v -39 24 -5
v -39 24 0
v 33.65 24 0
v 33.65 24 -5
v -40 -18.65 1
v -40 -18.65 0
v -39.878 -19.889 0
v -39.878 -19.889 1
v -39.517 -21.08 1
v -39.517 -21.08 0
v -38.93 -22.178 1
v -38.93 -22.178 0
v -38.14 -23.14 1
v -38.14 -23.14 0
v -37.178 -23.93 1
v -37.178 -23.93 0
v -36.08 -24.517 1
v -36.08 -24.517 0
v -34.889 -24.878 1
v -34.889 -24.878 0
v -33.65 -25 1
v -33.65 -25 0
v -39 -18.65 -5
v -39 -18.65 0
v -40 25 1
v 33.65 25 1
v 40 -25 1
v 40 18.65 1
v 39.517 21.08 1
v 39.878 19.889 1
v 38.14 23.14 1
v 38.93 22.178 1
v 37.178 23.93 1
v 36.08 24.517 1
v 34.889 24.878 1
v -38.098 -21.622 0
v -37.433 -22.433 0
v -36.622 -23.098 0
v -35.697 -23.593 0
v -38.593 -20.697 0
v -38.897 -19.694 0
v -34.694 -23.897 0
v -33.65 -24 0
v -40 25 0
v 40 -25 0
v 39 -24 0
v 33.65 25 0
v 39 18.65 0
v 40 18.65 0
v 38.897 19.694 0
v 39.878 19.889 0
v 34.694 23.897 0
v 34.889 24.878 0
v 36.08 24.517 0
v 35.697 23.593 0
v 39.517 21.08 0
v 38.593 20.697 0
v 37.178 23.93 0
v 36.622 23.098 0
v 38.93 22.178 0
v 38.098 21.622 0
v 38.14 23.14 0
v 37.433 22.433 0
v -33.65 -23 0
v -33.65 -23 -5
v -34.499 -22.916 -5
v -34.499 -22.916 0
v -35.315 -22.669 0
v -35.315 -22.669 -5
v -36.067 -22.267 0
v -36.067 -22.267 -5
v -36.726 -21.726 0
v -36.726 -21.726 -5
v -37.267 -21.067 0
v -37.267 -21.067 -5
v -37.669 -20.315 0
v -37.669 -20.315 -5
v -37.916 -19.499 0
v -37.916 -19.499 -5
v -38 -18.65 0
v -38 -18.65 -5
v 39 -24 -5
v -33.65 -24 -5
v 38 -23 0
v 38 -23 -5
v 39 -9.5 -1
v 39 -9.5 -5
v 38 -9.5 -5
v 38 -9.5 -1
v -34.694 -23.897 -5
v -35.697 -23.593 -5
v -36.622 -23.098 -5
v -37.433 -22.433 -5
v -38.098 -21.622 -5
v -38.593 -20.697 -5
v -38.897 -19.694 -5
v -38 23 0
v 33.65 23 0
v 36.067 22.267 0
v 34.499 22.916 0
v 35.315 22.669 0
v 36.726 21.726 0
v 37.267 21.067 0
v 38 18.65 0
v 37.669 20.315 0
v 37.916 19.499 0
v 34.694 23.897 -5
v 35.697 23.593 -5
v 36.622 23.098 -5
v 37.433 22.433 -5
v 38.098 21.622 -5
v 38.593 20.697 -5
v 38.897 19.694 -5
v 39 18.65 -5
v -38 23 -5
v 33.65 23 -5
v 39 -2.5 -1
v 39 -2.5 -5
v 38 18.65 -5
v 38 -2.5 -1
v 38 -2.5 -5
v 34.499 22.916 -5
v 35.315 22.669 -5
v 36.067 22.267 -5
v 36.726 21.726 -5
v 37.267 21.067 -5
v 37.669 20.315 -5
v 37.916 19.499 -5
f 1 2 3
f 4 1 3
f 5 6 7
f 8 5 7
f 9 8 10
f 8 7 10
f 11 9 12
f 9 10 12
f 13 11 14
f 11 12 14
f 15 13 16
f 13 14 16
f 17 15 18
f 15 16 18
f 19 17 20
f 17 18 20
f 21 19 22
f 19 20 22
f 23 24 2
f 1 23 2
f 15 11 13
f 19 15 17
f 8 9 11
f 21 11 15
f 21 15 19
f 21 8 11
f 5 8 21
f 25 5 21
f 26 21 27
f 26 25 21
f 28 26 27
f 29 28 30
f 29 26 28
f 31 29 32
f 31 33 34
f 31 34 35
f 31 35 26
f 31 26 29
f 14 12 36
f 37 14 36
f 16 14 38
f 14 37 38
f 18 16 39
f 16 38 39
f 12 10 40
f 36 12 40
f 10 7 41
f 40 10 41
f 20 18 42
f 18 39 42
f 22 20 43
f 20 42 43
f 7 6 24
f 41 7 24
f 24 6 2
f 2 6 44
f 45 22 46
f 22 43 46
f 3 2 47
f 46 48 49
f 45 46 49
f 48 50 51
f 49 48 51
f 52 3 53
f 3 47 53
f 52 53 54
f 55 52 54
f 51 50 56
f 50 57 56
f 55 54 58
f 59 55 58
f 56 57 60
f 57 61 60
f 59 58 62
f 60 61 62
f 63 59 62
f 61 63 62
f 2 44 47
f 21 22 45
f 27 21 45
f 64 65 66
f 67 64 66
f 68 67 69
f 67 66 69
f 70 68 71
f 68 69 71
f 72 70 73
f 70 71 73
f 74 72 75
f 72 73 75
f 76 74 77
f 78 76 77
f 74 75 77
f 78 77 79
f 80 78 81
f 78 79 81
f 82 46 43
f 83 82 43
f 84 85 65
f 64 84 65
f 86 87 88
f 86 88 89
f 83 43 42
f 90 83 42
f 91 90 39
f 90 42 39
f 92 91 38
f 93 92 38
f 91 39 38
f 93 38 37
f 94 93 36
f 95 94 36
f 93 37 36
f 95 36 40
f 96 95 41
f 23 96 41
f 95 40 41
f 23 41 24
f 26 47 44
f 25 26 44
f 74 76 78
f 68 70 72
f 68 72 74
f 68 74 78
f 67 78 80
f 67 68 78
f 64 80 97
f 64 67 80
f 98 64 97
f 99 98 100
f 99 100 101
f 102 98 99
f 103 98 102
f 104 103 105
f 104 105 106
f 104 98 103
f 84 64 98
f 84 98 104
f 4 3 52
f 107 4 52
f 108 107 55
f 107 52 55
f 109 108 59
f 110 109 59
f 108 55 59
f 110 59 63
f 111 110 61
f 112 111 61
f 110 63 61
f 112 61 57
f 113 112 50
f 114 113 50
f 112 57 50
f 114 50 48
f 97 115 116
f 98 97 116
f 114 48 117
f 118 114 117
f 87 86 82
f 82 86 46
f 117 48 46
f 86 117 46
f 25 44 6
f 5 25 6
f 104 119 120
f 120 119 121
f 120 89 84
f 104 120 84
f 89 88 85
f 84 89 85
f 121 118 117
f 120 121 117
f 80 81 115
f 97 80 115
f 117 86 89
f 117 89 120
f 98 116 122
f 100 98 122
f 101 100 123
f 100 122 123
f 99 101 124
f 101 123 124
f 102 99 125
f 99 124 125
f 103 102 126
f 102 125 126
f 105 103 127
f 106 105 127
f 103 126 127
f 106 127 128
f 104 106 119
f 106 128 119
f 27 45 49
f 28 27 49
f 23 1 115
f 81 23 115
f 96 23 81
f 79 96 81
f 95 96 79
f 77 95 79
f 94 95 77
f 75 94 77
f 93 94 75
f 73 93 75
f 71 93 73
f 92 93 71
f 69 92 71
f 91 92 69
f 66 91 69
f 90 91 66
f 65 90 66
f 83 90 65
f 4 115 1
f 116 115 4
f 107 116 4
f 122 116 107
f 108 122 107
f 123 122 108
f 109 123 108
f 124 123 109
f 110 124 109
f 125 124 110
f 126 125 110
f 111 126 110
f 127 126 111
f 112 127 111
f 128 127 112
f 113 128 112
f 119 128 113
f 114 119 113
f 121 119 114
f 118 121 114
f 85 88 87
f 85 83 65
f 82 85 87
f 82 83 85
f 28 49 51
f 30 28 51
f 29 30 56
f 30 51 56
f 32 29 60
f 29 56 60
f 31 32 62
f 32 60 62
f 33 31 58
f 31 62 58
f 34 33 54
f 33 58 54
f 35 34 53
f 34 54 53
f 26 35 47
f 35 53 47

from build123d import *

# Parameters (mm, degrees)
F1_DEPTH = 1
F3_DEPTH = 5
F5_DEPTH = 5
F6_W     = 7
F6_H     = 4
F7_DEPTH = 1


with BuildPart() as f1:
    # F0 (on Top) → F1 (new body)
    with BuildSketch(Plane.XY):
        with BuildLine():
            Line((-33.65, -25), (40, -25))
            Line((40, -25), (40, 18.65))
            ThreePointArc((40, 18.65), (38.140128, 23.140128), (33.65, 25))
            Line((33.65, 25), (-40, 25))
            Line((-40, 25), (-40, -18.65))
            ThreePointArc((-40, -18.65), (-38.140128, -23.140128), (-33.65, -25))
        make_face()
    extrude(amount=F1_DEPTH)

    # F2 (on face) → F3 (join)
    with BuildSketch(Plane(origin=(0, 0, 0), x_dir=(1, 0, 0), z_dir=(0, 0, -1))):
        with BuildLine():
            Line((39, 24), (-33.65, 24))
            ThreePointArc((-33.65, 24), (-37.433021, 22.433021), (-39, 18.65))
            Line((-39, 18.65), (-39, -24))
            Line((-39, -24), (33.65, -24))
            ThreePointArc((33.65, -24), (37.433021, -22.433021), (39, -18.65))
            Line((39, -18.65), (39, 24))
        make_face()
    extrude(amount=F3_DEPTH)

    # F4 (on face) → F5 (cut)
    with BuildSketch(Plane(origin=(0, 0, -5), x_dir=(1, 0, 0), z_dir=(0, 0, -1))):
        with BuildLine():
            Line((-38, 18.65), (-38, -23))
            Line((-38, -23), (33.65, -23))
            ThreePointArc((33.65, -23), (36.725914, -21.725914), (38, -18.65))
            Line((38, -18.65), (38, 23))
            Line((38, 23), (-33.65, 23))
            ThreePointArc((-33.65, 23), (-36.725914, 21.725914), (-38, 18.65))
        make_face()
    extrude(amount=-F5_DEPTH, mode=Mode.SUBTRACT)

    # F6 (on face) → F7 (cut, through all)
    with BuildSketch(Plane.YZ.offset(39)):
        with Locations((-6, -3)):
            Rectangle(F6_W, F6_H)
    extrude(amount=-F7_DEPTH, mode=Mode.SUBTRACT)


solid = f1.part
